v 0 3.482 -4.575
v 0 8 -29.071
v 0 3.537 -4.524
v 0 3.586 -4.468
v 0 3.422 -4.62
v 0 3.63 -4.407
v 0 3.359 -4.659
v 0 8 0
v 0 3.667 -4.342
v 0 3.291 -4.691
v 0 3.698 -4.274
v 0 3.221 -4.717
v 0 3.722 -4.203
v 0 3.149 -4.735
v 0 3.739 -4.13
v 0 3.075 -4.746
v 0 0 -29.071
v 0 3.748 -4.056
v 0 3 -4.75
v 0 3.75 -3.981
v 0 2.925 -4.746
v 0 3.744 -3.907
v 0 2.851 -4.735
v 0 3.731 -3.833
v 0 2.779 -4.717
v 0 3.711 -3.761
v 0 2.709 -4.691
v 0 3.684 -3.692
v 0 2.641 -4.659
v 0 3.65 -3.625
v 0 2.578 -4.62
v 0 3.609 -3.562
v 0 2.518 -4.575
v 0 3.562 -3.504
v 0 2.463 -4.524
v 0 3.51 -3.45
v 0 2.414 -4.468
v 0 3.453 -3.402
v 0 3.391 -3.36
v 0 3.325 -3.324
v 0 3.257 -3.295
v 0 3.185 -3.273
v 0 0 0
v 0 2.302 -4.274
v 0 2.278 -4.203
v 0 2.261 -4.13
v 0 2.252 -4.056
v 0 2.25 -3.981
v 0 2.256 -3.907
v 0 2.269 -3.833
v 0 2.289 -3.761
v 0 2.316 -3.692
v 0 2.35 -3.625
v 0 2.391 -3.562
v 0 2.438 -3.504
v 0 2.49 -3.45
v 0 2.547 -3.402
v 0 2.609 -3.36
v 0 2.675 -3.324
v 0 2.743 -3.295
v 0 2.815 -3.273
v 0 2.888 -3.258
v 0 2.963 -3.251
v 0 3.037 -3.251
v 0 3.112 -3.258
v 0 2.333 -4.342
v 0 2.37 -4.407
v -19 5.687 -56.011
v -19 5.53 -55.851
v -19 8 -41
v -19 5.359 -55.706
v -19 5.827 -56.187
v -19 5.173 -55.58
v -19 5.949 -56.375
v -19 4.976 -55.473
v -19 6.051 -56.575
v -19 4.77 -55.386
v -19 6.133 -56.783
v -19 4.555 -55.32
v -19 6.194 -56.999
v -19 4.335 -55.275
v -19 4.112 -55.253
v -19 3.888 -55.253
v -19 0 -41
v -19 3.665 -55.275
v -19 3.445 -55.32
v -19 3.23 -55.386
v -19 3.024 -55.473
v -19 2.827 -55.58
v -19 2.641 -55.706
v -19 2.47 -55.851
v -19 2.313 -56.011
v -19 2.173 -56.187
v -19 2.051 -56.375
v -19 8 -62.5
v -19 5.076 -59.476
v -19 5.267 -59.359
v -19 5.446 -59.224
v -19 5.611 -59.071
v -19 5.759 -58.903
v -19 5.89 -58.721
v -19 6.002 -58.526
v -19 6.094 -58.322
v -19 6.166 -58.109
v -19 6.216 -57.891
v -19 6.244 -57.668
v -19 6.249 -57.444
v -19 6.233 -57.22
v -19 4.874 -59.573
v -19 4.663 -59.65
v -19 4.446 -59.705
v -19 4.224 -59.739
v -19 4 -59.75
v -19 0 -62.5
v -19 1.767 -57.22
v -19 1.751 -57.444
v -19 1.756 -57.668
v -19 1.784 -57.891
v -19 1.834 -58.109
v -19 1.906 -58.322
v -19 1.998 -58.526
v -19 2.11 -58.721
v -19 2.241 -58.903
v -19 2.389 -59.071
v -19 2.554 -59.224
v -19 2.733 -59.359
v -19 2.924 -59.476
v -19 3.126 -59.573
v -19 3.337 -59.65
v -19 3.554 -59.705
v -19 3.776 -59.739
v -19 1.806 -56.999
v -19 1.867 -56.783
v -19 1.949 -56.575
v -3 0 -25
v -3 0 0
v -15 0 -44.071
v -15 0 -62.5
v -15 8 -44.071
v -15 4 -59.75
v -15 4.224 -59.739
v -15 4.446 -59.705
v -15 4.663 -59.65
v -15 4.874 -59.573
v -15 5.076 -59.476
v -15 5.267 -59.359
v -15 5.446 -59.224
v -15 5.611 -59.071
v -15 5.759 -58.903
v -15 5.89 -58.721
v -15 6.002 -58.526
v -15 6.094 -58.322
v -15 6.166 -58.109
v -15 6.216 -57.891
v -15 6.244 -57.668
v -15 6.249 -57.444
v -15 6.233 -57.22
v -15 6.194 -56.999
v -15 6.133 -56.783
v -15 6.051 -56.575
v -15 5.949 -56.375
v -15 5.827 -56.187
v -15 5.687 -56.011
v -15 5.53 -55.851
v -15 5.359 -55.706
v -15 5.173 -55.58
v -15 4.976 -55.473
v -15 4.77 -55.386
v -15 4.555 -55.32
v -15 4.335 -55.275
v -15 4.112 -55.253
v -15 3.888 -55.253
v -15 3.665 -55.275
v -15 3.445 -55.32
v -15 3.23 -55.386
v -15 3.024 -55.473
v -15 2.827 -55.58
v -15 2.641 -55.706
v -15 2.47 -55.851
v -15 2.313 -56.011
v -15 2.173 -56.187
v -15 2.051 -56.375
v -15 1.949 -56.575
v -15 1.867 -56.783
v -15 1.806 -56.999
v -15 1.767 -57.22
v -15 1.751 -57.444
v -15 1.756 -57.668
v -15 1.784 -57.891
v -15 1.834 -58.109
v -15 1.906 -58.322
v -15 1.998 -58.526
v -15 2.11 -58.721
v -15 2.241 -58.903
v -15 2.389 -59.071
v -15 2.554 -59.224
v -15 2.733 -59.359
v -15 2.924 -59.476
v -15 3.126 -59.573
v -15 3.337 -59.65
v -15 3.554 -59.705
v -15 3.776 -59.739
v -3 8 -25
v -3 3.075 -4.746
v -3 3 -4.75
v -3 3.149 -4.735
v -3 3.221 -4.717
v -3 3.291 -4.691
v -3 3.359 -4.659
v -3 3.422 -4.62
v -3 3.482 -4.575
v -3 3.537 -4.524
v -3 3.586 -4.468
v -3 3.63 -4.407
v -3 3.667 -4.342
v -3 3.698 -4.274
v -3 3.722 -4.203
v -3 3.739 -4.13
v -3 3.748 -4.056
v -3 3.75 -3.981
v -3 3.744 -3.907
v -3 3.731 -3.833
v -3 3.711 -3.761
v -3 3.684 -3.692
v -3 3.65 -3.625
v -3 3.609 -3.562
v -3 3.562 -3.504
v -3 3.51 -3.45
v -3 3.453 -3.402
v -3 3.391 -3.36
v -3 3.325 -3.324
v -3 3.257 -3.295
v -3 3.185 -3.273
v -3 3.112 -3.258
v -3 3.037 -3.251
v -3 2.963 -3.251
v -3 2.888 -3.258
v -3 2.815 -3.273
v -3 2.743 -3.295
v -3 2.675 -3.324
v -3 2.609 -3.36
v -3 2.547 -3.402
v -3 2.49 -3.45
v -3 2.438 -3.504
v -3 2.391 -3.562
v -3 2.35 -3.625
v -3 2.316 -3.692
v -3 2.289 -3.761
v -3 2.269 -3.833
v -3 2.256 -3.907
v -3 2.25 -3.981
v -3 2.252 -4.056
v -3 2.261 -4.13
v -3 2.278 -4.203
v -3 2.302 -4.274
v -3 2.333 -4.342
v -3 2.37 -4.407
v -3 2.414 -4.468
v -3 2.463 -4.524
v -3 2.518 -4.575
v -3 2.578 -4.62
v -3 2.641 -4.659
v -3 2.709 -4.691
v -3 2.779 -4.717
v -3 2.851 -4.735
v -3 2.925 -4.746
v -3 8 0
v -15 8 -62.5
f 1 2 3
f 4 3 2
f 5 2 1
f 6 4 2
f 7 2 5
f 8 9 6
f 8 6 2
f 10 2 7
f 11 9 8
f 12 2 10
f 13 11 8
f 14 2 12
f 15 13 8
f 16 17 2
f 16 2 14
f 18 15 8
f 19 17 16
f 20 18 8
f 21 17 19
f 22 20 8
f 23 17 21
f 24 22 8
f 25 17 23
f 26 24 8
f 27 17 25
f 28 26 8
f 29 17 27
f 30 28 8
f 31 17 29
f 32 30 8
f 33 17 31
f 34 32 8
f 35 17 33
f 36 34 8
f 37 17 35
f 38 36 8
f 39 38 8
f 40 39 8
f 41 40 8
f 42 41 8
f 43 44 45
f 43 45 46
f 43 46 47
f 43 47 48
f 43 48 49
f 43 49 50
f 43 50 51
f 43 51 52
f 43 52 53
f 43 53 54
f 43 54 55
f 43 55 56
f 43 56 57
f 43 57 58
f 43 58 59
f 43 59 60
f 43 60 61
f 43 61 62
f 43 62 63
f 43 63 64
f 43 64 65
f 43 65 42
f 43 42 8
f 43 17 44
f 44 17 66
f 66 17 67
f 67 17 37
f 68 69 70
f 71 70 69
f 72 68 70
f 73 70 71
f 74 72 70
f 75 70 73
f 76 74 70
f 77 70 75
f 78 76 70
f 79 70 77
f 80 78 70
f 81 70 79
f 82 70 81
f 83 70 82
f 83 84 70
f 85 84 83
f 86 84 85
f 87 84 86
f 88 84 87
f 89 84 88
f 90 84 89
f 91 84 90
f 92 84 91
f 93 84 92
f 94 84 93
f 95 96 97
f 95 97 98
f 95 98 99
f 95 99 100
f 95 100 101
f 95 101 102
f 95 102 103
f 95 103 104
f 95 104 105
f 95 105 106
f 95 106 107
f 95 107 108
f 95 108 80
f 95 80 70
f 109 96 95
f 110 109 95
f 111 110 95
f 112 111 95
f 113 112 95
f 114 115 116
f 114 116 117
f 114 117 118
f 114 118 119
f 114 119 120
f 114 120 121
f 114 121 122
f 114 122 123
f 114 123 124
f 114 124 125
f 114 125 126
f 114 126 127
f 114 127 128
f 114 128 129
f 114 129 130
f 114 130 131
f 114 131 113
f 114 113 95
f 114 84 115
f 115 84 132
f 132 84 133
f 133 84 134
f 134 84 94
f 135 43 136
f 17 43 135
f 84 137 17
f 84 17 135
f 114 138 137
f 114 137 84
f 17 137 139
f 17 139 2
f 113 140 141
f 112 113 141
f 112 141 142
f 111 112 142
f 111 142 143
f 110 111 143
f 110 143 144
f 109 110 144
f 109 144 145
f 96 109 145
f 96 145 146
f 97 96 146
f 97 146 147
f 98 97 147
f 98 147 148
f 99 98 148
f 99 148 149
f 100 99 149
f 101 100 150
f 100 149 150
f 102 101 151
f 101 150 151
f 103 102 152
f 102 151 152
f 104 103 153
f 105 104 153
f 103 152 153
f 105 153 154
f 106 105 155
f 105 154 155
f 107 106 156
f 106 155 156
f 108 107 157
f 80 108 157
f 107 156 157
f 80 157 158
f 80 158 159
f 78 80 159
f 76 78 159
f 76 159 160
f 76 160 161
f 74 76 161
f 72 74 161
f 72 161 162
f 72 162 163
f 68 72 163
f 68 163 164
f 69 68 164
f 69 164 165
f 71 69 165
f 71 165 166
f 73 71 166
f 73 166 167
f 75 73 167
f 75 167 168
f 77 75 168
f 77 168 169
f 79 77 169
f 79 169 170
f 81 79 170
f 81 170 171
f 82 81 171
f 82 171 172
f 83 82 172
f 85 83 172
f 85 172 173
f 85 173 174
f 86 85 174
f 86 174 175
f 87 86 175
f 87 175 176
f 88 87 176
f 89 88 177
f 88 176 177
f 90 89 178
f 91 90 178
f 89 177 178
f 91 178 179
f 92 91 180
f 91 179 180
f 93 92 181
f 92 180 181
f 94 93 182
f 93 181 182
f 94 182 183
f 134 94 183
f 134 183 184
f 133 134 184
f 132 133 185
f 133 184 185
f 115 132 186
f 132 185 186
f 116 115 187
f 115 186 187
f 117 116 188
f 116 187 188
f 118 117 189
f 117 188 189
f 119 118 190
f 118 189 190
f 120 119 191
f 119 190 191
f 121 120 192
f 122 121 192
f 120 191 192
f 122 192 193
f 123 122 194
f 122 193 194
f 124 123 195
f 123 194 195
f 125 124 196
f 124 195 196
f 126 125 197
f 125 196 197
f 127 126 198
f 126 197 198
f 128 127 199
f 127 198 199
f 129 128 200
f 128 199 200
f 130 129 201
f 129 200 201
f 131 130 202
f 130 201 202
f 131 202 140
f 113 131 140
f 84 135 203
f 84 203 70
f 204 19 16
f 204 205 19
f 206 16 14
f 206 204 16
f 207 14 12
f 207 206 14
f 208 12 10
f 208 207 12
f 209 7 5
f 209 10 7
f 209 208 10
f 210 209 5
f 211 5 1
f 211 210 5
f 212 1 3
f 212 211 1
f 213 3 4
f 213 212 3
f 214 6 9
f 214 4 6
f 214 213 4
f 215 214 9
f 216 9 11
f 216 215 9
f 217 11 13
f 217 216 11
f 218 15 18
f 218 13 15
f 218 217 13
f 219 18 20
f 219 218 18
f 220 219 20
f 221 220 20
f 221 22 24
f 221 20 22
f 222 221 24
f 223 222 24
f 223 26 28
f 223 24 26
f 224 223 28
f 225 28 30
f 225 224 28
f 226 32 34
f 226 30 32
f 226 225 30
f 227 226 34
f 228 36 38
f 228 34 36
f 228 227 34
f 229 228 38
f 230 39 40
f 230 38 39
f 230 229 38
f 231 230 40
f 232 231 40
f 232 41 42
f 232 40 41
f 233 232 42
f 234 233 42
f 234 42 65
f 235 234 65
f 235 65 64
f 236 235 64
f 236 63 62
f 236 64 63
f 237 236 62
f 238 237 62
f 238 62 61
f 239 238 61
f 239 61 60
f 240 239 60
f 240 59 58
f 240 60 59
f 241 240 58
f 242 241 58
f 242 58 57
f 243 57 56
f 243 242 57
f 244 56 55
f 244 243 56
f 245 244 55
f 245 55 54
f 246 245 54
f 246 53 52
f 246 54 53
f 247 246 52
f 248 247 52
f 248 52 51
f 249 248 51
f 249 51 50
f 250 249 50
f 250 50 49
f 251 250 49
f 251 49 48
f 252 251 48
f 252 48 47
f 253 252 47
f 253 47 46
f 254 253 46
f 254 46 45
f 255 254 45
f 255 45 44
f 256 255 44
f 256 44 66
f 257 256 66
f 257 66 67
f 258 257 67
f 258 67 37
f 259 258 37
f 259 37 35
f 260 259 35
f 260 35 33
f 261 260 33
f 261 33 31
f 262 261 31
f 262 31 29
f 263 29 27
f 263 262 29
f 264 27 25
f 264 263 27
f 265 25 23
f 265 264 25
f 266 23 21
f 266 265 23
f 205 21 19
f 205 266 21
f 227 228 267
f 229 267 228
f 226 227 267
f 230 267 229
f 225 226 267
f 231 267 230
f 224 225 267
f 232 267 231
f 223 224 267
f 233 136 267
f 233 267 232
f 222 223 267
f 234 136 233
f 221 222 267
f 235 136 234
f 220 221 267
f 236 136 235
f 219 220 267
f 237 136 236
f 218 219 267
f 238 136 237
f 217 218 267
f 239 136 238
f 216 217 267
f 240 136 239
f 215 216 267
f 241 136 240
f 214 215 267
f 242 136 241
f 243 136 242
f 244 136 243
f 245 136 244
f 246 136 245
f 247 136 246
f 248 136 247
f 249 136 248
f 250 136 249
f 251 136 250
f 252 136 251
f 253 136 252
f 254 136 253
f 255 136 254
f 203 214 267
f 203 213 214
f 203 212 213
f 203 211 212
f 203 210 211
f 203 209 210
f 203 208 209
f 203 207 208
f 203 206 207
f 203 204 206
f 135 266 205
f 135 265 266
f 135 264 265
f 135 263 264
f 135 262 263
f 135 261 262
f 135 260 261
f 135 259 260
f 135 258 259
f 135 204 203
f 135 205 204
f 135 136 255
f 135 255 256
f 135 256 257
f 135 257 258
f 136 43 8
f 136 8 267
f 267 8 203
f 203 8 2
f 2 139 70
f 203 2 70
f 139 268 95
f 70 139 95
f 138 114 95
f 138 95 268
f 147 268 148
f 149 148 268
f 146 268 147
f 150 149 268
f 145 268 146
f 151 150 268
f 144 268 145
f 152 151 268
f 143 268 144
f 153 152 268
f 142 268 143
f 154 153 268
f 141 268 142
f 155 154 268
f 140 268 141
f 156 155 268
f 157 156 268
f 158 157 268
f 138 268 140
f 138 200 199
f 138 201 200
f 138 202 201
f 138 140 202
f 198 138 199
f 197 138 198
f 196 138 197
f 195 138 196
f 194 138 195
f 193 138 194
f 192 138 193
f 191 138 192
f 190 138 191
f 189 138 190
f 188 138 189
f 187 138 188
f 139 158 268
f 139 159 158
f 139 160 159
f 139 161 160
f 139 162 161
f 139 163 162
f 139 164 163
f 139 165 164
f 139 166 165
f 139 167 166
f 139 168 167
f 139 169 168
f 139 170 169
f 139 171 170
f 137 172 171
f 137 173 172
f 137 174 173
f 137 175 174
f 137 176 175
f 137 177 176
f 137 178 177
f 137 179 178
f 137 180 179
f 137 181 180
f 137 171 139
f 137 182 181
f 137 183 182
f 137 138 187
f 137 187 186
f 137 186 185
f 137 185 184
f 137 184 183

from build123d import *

# Parameters (mm, degrees)
BOSS_EXTRUDE1_DEPTH     = 8
SKETCH2_R               = 2.25
SKETCH2_R_2             = 0.75
CUT_EXTRUDE1_DEPTH      = 16
CUT_EXTRUDE1_DEPTH_BACK = 5


with BuildPart() as part:
    # Sketch1 → Boss-Extrude1 (new body)
    with BuildSketch(Plane(origin=(0, 0, 0), x_dir=(1, 0, 0), z_dir=(0, 1, 0))):
        Polygon((0, 0), (-3, 0), (-3, 25), (-19, 41), (-19, 62.5), (-15, 62.5), (-15, 44.071067812), (0, 29.071067812), align=None)
    extrude(amount=BOSS_EXTRUDE1_DEPTH)

    # Sketch2 → Cut-Extrude1 (cut, two sides)
    with BuildSketch(Plane(origin=(-15, 0, 0), x_dir=(0, 0, -1), z_dir=(1, 0, 0))) as cut_extrude1_sk:
        with Locations((57.5, 4)):
            Circle(SKETCH2_R)
        with Locations((4, 3)):
            Circle(SKETCH2_R_2)
    extrude(amount=CUT_EXTRUDE1_DEPTH, mode=Mode.SUBTRACT)
    extrude(cut_extrude1_sk.sketch, amount=-CUT_EXTRUDE1_DEPTH_BACK, mode=Mode.SUBTRACT)


solid = part.part
